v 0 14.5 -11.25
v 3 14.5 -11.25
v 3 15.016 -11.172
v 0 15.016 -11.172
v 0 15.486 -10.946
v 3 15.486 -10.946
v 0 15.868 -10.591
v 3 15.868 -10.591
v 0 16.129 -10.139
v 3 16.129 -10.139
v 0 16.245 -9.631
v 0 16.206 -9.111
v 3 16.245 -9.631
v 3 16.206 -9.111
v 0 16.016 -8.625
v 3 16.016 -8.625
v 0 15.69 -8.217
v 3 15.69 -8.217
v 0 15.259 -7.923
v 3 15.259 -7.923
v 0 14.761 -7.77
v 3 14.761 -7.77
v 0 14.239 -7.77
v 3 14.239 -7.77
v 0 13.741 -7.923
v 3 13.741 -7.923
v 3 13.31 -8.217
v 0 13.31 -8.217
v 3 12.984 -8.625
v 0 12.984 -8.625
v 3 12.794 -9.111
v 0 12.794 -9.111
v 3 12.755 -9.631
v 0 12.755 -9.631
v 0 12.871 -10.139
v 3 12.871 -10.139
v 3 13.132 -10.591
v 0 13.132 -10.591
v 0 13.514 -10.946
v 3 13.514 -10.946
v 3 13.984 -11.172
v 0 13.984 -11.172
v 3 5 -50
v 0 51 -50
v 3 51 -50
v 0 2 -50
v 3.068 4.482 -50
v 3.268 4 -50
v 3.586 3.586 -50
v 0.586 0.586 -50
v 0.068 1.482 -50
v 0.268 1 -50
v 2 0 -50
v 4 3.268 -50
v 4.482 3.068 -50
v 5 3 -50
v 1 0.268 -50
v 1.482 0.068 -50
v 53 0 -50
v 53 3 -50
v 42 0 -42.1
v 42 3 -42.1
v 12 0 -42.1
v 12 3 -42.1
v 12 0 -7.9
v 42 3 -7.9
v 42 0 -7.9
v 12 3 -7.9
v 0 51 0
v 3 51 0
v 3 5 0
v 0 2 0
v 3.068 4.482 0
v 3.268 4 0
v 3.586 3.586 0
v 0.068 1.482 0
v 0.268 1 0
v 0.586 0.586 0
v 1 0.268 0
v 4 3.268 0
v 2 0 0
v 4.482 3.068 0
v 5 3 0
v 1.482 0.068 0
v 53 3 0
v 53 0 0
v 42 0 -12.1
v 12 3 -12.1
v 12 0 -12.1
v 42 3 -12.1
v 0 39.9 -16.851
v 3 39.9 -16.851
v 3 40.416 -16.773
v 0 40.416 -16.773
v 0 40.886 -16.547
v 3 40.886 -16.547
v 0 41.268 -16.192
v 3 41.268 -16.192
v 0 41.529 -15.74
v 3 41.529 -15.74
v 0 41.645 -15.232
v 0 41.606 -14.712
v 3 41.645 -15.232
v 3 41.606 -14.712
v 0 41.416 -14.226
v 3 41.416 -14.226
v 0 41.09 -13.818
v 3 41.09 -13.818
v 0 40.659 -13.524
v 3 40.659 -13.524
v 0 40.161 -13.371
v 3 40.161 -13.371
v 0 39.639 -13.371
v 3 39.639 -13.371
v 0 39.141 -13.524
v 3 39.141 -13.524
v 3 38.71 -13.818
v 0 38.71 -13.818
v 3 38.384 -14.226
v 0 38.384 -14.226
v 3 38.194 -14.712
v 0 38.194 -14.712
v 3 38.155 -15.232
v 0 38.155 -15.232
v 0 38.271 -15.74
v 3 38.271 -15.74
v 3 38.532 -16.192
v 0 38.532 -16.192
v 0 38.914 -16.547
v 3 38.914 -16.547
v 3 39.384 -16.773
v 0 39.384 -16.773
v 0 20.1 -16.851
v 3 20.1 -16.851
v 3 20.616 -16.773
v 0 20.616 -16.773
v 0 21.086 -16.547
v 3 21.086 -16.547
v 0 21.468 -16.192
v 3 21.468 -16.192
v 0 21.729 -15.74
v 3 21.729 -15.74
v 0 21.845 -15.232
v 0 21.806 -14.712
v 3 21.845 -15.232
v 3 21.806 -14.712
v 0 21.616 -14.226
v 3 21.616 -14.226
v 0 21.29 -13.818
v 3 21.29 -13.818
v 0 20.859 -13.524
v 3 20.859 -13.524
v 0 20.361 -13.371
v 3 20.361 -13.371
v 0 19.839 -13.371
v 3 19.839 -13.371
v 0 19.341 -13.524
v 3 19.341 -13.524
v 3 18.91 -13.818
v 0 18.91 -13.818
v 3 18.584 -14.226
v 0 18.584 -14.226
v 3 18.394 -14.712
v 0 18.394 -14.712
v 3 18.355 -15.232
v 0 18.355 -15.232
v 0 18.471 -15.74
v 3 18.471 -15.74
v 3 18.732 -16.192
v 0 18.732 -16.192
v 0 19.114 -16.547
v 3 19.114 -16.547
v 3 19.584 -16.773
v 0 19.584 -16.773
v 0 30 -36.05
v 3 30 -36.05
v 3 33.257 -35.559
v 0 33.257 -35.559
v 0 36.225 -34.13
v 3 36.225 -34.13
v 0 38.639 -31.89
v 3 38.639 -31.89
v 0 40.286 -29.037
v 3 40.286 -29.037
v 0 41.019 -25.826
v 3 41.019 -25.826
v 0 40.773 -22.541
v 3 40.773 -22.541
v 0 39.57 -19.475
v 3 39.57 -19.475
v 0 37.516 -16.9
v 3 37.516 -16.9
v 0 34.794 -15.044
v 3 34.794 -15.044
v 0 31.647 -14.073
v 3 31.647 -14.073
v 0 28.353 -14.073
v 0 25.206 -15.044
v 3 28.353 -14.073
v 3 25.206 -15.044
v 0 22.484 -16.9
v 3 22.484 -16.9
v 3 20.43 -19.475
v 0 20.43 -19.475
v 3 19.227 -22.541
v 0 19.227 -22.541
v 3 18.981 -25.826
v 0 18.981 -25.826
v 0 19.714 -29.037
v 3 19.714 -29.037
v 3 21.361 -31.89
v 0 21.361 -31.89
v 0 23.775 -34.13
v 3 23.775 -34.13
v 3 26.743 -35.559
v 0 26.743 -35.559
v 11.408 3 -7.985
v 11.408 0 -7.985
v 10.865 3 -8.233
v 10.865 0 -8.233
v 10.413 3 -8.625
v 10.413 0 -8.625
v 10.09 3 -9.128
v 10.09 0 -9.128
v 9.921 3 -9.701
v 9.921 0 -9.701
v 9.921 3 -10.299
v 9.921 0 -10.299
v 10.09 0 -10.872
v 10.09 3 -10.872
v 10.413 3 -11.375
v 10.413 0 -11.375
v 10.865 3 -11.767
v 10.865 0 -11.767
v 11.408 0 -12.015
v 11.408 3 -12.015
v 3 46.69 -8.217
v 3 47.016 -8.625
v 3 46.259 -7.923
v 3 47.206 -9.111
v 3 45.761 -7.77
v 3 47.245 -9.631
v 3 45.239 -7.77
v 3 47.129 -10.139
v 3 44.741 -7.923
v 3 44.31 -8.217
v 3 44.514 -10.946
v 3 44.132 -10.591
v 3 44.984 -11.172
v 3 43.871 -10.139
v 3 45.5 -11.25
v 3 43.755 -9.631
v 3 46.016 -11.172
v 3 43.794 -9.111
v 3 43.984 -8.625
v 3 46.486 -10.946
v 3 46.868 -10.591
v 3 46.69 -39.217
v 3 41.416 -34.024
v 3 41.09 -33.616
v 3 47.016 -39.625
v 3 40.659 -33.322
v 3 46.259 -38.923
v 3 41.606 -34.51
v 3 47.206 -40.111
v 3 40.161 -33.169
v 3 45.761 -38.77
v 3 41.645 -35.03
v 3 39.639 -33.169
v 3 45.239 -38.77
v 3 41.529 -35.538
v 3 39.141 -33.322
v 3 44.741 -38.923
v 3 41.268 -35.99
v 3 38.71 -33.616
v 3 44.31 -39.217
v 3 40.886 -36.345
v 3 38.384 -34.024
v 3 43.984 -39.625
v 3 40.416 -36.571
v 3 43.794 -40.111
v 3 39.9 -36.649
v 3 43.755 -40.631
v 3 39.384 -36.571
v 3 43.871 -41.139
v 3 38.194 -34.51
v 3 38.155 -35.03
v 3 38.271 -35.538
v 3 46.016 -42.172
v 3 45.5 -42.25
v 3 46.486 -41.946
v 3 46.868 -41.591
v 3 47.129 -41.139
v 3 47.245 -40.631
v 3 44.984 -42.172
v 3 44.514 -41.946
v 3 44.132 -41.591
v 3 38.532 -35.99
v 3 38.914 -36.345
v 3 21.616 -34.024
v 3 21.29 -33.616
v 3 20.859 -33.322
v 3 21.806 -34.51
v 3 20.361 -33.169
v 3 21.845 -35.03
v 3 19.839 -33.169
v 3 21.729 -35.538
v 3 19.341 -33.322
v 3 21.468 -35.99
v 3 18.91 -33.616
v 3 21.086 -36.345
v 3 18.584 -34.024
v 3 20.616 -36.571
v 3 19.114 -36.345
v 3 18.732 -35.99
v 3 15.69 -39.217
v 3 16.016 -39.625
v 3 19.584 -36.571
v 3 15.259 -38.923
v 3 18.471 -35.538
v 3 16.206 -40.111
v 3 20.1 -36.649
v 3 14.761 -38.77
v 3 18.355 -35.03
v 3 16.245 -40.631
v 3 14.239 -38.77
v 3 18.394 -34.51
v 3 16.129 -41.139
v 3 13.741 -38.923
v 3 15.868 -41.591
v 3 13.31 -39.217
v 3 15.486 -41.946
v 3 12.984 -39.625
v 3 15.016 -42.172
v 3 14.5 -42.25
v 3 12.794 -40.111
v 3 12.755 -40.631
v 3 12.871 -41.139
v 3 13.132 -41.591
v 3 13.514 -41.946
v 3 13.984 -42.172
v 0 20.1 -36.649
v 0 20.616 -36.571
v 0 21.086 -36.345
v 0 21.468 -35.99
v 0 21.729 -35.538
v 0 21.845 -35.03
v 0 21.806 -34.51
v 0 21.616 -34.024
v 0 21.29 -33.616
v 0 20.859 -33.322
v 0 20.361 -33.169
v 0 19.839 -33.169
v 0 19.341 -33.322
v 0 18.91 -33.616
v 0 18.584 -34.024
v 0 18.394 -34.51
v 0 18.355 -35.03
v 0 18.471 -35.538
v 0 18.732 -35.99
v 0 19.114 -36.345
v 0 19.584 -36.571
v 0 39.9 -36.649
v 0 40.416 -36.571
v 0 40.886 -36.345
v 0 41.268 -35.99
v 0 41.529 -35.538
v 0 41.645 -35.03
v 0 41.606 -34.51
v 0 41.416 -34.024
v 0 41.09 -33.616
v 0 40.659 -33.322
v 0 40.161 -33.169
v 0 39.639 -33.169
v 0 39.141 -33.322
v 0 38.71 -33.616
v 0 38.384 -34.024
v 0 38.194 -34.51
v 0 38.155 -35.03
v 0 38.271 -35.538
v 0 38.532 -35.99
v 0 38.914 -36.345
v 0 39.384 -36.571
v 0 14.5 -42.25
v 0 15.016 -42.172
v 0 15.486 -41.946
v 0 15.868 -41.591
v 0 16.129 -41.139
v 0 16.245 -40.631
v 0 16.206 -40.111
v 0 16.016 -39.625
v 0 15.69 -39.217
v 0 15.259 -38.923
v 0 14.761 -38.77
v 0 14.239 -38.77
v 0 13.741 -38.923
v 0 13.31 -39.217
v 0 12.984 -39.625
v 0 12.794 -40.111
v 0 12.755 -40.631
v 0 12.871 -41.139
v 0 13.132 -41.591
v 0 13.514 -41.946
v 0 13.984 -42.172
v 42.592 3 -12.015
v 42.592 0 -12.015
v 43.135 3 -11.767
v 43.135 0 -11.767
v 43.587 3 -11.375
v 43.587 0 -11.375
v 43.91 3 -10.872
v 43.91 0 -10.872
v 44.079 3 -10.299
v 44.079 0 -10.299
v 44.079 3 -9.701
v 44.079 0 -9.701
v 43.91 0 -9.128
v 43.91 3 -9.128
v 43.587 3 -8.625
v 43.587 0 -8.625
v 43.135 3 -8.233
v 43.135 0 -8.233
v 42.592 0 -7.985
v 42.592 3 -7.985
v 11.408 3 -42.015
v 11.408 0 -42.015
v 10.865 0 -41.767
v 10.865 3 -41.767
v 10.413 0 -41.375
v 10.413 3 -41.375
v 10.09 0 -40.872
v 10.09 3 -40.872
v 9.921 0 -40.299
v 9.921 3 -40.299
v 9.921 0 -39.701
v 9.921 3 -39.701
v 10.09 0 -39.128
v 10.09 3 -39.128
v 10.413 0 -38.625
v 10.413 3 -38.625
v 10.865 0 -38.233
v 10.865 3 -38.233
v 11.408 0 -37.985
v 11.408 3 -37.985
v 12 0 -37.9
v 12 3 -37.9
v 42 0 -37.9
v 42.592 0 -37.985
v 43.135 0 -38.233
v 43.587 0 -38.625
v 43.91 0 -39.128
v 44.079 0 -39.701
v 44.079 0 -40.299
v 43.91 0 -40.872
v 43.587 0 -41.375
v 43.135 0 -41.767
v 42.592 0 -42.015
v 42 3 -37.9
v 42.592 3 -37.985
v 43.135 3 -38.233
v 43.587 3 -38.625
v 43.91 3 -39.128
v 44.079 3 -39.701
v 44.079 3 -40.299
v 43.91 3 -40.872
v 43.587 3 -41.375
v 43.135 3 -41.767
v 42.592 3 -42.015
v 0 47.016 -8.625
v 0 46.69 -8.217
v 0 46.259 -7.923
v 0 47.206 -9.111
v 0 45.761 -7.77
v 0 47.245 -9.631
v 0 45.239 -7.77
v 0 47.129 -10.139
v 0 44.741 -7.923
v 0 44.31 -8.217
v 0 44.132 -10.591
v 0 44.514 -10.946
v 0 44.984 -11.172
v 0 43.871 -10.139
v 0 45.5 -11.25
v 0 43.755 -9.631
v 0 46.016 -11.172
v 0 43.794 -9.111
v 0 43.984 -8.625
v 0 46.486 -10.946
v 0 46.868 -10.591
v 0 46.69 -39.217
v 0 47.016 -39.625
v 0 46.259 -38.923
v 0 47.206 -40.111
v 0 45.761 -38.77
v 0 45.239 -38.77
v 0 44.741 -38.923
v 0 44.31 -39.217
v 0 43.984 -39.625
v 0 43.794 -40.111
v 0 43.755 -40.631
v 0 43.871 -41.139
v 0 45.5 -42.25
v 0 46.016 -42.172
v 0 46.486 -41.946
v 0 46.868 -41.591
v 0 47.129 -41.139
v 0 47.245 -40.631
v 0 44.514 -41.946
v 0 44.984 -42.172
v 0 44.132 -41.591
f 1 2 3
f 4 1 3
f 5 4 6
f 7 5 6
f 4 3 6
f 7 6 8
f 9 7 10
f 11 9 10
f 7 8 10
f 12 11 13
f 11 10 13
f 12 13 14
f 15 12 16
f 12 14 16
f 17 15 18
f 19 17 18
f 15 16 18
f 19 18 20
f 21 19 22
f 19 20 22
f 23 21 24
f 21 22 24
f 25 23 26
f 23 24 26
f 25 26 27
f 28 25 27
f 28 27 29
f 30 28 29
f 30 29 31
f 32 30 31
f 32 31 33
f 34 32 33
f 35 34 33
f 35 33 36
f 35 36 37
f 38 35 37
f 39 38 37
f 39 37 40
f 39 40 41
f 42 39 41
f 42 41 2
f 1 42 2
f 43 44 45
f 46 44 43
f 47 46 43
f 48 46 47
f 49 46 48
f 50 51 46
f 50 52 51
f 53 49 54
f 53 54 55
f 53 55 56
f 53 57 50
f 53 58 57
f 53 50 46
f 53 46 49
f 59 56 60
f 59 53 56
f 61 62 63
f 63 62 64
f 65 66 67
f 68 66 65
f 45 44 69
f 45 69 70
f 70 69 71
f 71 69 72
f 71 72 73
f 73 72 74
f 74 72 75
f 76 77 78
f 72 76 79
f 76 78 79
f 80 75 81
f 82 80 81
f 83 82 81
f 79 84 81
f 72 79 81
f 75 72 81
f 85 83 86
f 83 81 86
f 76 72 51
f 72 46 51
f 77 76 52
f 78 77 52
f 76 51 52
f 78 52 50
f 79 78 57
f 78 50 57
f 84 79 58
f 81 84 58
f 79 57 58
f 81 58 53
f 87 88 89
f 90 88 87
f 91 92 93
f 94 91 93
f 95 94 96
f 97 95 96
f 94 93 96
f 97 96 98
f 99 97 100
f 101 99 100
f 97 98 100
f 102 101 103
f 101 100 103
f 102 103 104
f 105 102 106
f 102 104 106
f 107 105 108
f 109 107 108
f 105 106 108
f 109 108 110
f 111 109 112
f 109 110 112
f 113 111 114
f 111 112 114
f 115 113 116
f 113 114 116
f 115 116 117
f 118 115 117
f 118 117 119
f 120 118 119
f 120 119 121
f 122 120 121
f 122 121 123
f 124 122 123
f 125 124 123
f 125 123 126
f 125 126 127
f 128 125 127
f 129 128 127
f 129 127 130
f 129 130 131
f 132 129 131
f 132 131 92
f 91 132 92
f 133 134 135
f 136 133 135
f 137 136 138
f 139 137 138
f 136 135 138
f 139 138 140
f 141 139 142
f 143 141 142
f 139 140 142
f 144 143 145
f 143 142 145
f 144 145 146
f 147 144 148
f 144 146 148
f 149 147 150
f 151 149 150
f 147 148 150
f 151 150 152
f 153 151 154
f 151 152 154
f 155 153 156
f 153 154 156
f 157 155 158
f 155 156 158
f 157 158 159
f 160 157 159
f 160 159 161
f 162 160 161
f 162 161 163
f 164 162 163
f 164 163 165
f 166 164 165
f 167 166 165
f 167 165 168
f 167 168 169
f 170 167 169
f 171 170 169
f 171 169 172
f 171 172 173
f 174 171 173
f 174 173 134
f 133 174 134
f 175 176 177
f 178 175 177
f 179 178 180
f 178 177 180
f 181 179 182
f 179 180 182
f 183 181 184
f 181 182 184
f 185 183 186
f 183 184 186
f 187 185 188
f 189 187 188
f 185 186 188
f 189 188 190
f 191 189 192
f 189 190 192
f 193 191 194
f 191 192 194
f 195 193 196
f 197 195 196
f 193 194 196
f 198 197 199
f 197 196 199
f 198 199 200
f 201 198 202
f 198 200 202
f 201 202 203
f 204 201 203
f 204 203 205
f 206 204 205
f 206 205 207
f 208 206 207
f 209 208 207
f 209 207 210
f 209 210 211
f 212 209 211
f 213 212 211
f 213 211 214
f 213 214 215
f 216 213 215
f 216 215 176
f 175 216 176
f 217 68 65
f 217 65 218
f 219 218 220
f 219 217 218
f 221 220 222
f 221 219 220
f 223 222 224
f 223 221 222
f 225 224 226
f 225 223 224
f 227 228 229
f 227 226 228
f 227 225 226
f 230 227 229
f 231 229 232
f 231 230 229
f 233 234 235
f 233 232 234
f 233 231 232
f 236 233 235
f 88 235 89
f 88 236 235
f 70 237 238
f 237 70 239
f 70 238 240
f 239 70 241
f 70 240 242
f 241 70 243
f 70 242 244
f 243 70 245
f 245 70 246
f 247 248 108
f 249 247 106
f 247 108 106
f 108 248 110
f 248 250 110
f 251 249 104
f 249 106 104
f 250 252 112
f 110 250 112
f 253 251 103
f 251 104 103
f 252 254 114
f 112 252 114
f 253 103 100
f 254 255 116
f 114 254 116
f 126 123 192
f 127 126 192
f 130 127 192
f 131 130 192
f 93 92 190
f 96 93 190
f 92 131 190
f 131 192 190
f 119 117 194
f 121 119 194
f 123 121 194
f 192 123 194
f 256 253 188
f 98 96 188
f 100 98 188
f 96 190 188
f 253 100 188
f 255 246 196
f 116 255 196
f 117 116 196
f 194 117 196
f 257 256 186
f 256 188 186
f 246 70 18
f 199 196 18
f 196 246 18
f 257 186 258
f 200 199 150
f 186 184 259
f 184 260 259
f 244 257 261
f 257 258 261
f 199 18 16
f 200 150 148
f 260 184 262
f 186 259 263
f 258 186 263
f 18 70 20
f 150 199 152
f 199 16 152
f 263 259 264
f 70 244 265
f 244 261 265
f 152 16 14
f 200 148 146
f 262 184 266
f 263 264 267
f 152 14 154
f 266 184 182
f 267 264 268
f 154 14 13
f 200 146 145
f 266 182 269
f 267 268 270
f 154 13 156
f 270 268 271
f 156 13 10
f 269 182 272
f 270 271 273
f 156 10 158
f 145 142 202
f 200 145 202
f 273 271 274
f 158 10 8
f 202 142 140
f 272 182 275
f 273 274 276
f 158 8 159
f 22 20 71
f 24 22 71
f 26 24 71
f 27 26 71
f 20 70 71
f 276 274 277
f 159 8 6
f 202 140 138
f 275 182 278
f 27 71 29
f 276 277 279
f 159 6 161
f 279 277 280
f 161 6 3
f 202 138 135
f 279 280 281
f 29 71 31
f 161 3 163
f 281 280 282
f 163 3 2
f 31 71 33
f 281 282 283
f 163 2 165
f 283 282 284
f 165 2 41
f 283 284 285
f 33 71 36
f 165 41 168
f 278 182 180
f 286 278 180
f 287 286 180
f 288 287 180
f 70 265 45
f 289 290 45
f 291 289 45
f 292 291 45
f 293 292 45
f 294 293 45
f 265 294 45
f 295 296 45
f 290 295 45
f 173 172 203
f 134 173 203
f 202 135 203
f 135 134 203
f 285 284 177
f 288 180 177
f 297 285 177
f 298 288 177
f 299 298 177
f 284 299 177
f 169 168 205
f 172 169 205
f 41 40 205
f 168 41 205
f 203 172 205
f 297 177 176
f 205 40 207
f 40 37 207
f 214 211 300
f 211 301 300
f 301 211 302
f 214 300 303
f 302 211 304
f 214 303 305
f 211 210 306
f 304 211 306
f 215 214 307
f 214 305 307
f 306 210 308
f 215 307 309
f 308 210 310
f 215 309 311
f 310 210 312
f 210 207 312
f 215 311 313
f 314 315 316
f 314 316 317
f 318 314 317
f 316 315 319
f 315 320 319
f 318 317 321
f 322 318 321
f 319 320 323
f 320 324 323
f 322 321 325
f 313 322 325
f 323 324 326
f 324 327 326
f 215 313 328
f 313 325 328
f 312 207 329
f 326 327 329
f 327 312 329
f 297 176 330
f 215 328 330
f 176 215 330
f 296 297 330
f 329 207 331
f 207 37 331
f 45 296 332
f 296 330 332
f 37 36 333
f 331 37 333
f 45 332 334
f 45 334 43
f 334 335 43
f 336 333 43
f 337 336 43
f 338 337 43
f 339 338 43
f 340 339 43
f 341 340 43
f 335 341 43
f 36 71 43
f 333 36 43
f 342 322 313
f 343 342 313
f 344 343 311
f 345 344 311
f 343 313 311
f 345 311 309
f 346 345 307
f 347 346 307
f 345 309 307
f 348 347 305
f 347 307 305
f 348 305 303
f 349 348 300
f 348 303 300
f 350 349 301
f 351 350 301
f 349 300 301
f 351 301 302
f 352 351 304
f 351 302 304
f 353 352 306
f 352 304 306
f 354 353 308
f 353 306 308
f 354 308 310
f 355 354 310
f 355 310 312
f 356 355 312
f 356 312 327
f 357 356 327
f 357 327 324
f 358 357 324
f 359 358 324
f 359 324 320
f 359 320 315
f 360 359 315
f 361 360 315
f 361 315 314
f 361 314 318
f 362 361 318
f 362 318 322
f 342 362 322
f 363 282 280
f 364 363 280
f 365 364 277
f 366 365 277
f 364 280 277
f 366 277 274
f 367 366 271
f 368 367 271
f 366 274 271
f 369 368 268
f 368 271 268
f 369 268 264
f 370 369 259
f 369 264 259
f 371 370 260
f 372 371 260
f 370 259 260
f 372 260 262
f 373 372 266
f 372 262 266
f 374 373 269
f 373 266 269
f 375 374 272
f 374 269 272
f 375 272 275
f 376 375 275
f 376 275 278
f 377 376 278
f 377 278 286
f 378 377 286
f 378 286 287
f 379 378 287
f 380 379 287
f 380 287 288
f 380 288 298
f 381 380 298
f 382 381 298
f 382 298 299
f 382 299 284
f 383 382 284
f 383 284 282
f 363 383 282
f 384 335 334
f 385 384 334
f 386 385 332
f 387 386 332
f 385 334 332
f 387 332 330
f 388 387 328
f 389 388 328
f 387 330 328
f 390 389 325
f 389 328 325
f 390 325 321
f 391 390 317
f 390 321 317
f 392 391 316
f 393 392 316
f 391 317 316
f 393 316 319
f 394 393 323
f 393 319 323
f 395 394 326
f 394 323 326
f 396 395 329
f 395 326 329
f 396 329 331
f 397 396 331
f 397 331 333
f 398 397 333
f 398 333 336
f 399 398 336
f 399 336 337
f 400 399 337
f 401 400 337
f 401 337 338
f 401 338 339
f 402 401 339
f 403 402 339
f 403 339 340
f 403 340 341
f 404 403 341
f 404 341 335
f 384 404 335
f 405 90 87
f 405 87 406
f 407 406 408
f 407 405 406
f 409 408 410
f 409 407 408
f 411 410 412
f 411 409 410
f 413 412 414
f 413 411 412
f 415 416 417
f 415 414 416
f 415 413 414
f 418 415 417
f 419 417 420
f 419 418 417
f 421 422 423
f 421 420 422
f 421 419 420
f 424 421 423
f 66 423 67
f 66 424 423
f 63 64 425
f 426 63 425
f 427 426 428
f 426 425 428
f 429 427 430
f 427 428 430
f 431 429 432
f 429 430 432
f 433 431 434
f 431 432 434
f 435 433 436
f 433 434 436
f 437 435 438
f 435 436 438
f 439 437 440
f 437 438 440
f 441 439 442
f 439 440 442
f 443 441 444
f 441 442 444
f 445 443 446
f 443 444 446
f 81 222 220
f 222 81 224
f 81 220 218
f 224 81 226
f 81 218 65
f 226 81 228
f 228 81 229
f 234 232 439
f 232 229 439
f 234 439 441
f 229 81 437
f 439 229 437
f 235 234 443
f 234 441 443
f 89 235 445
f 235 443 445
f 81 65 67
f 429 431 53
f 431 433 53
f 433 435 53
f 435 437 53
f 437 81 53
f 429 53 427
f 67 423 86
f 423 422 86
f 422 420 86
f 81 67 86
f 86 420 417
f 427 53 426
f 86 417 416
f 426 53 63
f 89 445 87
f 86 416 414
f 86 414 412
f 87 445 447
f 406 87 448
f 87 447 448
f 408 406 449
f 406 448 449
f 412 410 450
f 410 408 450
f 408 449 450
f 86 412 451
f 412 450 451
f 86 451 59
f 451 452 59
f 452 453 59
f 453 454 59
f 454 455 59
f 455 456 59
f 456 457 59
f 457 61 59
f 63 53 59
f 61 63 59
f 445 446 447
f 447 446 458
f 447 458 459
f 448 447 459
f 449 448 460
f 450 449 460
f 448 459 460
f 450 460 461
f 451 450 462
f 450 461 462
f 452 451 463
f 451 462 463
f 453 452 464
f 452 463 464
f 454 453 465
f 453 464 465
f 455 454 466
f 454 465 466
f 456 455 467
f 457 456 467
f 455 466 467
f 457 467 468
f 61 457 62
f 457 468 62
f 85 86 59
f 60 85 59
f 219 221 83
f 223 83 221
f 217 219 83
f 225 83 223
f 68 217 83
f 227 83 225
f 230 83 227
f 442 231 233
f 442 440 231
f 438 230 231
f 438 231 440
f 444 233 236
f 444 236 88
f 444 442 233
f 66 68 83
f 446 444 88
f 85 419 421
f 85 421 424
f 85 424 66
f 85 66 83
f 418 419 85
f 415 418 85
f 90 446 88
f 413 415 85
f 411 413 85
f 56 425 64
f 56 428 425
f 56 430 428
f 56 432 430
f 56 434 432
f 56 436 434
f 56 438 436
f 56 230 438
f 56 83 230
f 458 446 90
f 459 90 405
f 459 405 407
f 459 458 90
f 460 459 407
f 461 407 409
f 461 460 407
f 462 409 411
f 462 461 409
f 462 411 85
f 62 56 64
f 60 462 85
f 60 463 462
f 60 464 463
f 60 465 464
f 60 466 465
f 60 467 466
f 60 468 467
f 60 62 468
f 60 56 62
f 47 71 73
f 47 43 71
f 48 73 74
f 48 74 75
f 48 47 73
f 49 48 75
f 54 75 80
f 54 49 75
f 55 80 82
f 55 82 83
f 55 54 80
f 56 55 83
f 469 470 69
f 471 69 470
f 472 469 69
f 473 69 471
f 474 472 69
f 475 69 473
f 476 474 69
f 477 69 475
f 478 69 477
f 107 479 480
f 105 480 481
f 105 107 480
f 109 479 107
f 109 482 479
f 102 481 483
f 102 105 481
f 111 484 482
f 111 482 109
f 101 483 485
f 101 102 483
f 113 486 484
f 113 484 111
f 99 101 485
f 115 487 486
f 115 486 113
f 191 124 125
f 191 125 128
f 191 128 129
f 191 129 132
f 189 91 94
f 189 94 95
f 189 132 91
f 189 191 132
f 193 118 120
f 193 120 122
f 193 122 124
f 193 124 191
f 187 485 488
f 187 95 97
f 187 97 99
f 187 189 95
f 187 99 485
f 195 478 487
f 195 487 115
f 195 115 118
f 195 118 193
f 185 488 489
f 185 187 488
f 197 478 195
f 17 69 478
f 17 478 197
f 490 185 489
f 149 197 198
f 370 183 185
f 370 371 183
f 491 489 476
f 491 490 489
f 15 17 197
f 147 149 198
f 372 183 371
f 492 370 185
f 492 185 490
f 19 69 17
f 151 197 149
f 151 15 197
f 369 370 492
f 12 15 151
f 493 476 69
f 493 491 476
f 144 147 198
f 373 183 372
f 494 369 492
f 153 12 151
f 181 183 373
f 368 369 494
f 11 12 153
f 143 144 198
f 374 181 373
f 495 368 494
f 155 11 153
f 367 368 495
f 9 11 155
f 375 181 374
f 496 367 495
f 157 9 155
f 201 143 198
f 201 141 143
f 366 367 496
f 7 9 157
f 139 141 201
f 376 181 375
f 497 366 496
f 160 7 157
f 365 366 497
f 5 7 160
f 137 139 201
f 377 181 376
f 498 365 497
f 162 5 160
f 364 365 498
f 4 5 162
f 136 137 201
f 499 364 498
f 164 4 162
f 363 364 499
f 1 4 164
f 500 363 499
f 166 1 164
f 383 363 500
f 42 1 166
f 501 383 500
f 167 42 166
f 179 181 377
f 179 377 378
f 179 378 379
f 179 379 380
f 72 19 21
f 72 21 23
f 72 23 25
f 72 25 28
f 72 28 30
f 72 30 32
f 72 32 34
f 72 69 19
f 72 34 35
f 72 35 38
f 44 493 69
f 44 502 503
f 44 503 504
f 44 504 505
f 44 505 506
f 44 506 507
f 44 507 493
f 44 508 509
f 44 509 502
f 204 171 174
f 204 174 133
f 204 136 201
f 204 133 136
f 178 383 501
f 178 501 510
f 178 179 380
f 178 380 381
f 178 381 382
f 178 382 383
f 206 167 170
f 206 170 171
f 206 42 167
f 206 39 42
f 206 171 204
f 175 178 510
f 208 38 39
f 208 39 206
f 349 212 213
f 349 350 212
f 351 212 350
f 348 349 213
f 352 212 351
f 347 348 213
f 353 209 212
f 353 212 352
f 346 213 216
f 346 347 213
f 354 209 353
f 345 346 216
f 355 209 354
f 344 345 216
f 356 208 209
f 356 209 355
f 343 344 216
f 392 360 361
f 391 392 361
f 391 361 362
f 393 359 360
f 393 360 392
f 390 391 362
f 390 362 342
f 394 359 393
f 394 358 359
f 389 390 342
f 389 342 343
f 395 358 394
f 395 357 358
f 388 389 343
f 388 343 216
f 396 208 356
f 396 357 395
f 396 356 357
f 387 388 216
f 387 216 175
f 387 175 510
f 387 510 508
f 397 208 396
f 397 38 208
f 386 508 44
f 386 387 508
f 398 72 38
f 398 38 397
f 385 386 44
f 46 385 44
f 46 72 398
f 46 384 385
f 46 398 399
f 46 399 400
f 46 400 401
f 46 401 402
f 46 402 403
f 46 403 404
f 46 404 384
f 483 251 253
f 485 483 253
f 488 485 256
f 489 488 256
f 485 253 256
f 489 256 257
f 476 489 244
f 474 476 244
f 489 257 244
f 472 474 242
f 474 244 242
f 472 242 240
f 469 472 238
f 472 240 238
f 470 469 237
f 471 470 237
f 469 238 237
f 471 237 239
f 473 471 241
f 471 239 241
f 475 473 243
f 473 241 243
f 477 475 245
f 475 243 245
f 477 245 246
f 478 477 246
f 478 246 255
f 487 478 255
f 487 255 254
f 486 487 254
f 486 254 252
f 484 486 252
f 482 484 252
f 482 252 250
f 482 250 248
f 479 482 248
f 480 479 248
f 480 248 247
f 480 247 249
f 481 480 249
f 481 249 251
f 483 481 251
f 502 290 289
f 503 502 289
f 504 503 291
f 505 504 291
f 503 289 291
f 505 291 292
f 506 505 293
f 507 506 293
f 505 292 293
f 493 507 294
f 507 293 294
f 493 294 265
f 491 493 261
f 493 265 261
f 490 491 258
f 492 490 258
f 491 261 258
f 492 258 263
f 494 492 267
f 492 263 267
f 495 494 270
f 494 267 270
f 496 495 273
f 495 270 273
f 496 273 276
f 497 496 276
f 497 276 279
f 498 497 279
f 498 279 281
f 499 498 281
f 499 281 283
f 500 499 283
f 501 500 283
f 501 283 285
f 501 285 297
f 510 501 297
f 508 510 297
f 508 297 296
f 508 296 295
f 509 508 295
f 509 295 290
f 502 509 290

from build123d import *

# Parameters (mm, degrees)
SKETCH1_W           = 53
SKETCH1_H           = 50
BOSS_EXTRUDE1_DEPTH = 3
SKETCH2_W           = 3
SKETCH2_H           = 50
BOSS_EXTRUDE2_DEPTH = 48
CUT_EXTRUDE1_DEPTH  = 4
FILLET1_R           = 2
SKETCH4_R           = 1.75
SKETCH4_R_2         = 11.05
CUT_EXTRUDE2_DEPTH  = 4


with BuildPart() as part:
    # Sketch1 → Boss-Extrude1 (new body)
    with BuildSketch(Plane(origin=(0, 0, 0), x_dir=(1, 0, 0), z_dir=(0, 1, 0))):
        with Locations((26.5, 25)):
            Rectangle(SKETCH1_W, SKETCH1_H)
    extrude(amount=BOSS_EXTRUDE1_DEPTH)

    # Sketch2 → Boss-Extrude2 (add)
    with BuildSketch(Plane(origin=(0, 3, 0), x_dir=(1, 0, 0), z_dir=(0, 1, 0))):
        with Locations((1.5, 25)):
            Rectangle(SKETCH2_W, SKETCH2_H)
    extrude(amount=BOSS_EXTRUDE2_DEPTH)

    # Sketch3 → Cut-Extrude1 (cut, through all)
    with BuildSketch(Plane(origin=(0, 3, 0), x_dir=(1, 0, 0), z_dir=(0, 1, 0))):
        with BuildLine():
            Line((12, 37.9), (42, 37.9))
            ThreePointArc((42, 37.9), (44.1, 40), (42, 42.1))
            Line((42, 42.1), (12, 42.1))
            ThreePointArc((12, 42.1), (9.9, 40), (12, 37.9))
        make_face()
        with BuildLine():
            ThreePointArc((42, 12.1), (44.1, 10), (42, 7.9))
            Line((42, 7.9), (12, 7.9))
            ThreePointArc((12, 7.9), (9.9, 10), (12, 12.1))
            Line((12, 12.1), (42, 12.1))
        make_face()
    extrude(amount=-CUT_EXTRUDE1_DEPTH, mode=Mode.SUBTRACT)

    # Fillet1
    fillet1_edges = [part.edges().sort_by_distance(p)[0] for p in [
        (3, 3, -25),
        (0, 0, -25),
    ]]
    fillet(fillet1_edges, radius=FILLET1_R)

    # Sketch4 → Cut-Extrude2 (cut, through all)
    with BuildSketch(Plane(origin=(3, 0, 0), x_dir=(0, 0, -1), z_dir=(1, 0, 0))):
        with Locations((9.5, 45.5)):
            Circle(SKETCH4_R)
        with Locations((15.101010153, 39.9)):
            Circle(SKETCH4_R)
        with Locations((25, 30)):
            Circle(SKETCH4_R_2)
        with Locations((15.101010153, 20.1)):
            Circle(SKETCH4_R)
        with Locations((9.5, 14.5)):
            Circle(SKETCH4_R)
        with Locations((34.898989847, 20.1)):
            Circle(SKETCH4_R)
        with Locations((40.5, 14.5)):
            Circle(SKETCH4_R)
        with Locations((34.898989847, 39.9)):
            Circle(SKETCH4_R)
        with Locations((40.5, 45.5)):
            Circle(SKETCH4_R)
    extrude(amount=-CUT_EXTRUDE2_DEPTH, mode=Mode.SUBTRACT)


solid = part.part
